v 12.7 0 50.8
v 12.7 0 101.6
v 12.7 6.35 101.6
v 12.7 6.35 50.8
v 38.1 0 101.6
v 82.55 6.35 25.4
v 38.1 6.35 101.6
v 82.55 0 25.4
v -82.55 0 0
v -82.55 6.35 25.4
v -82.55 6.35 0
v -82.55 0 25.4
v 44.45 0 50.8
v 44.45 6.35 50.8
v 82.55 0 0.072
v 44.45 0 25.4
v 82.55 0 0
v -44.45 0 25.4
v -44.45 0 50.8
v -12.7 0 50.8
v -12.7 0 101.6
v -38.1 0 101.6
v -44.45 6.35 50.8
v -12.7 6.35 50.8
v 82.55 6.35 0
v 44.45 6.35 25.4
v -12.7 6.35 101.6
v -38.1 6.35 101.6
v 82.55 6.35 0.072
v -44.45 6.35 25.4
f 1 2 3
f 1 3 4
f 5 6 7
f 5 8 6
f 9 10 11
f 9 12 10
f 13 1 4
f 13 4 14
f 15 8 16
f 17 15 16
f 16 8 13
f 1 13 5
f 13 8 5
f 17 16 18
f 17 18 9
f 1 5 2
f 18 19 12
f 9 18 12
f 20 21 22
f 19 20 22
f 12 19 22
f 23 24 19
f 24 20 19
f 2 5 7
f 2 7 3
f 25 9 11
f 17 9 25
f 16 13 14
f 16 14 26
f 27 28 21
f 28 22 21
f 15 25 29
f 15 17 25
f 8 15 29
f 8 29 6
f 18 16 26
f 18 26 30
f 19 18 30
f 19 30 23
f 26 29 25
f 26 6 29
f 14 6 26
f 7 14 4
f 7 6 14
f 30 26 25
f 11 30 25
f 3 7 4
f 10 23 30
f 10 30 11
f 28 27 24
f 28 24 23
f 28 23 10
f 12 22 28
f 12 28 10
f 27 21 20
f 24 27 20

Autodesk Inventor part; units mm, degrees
ref_plane "YZ Plane" through (0, 0, 0) normal (1, 0, 0) x (0, 1, 0)
ref_plane "XZ Plane" through (0, 0, 0) normal (0, 1, 0) x (-1, 0, 0)
ref_plane "XY Plane" through (0, 0, 0) normal (0, 0, 1) x (1, 0, 0)
sketch "Sketch1" plane through (0, 0, 0) normal (0, 1, 0) x (-1, 0, 0)
  line L0 (82.55, 0) -> (-82.55, 0)
  line L1 (-82.55, 0) -> (-82.55, 0.0715)
  line L2 (-82.55, 0.0715) -> (-82.55, 25.4)
  line L3 (-38.1, 101.6) -> (-12.7, 101.6)
  line L4 (-12.7, 101.6) -> (-12.7, 50.8)
  line L5 (-12.7, 50.8) -> (-44.45, 50.8)
  line L6 (-44.45, 50.8) -> (-44.45, 25.4)
  line L7 (-44.45, 25.4) -> (44.45, 25.4)
  line L8 (44.45, 25.4) -> (44.45, 50.8)
  line L9 (38.1, 101.6) -> (82.55, 25.4)
  line L10 (82.55, 25.4) -> (82.55, 0)
  line L11 (38.1, 101.6) -> (12.7, 101.6)
  line L12 (12.7, 101.6) -> (12.7, 50.8)
  line L13 (12.7, 50.8) -> (44.45, 50.8)
  line L14 (0, 0) -> (0, 111.0493) construction
  line L15 (-82.55, 25.4) -> (-38.1, 101.6)
  point P0 (82.55, 12.7)
  dimension "d0" = 165.1
  dimension "d3" = 38.1
  dimension "d4" = 25.4
  dimension "d5" = 25.4
  dimension "d6" = 101.6
  dimension "d7" = 44.45
  dimension "d8" = 69.85
  dimension "d9" = 120.65
  dimension "d10" = 25.4
  dimension "d11" = 88.9
  dimension "d12" = 25.4
extrude "Extrusion1" add sketch "Sketch1" along normal blind 6.35
properties part number "Latch Clip"
